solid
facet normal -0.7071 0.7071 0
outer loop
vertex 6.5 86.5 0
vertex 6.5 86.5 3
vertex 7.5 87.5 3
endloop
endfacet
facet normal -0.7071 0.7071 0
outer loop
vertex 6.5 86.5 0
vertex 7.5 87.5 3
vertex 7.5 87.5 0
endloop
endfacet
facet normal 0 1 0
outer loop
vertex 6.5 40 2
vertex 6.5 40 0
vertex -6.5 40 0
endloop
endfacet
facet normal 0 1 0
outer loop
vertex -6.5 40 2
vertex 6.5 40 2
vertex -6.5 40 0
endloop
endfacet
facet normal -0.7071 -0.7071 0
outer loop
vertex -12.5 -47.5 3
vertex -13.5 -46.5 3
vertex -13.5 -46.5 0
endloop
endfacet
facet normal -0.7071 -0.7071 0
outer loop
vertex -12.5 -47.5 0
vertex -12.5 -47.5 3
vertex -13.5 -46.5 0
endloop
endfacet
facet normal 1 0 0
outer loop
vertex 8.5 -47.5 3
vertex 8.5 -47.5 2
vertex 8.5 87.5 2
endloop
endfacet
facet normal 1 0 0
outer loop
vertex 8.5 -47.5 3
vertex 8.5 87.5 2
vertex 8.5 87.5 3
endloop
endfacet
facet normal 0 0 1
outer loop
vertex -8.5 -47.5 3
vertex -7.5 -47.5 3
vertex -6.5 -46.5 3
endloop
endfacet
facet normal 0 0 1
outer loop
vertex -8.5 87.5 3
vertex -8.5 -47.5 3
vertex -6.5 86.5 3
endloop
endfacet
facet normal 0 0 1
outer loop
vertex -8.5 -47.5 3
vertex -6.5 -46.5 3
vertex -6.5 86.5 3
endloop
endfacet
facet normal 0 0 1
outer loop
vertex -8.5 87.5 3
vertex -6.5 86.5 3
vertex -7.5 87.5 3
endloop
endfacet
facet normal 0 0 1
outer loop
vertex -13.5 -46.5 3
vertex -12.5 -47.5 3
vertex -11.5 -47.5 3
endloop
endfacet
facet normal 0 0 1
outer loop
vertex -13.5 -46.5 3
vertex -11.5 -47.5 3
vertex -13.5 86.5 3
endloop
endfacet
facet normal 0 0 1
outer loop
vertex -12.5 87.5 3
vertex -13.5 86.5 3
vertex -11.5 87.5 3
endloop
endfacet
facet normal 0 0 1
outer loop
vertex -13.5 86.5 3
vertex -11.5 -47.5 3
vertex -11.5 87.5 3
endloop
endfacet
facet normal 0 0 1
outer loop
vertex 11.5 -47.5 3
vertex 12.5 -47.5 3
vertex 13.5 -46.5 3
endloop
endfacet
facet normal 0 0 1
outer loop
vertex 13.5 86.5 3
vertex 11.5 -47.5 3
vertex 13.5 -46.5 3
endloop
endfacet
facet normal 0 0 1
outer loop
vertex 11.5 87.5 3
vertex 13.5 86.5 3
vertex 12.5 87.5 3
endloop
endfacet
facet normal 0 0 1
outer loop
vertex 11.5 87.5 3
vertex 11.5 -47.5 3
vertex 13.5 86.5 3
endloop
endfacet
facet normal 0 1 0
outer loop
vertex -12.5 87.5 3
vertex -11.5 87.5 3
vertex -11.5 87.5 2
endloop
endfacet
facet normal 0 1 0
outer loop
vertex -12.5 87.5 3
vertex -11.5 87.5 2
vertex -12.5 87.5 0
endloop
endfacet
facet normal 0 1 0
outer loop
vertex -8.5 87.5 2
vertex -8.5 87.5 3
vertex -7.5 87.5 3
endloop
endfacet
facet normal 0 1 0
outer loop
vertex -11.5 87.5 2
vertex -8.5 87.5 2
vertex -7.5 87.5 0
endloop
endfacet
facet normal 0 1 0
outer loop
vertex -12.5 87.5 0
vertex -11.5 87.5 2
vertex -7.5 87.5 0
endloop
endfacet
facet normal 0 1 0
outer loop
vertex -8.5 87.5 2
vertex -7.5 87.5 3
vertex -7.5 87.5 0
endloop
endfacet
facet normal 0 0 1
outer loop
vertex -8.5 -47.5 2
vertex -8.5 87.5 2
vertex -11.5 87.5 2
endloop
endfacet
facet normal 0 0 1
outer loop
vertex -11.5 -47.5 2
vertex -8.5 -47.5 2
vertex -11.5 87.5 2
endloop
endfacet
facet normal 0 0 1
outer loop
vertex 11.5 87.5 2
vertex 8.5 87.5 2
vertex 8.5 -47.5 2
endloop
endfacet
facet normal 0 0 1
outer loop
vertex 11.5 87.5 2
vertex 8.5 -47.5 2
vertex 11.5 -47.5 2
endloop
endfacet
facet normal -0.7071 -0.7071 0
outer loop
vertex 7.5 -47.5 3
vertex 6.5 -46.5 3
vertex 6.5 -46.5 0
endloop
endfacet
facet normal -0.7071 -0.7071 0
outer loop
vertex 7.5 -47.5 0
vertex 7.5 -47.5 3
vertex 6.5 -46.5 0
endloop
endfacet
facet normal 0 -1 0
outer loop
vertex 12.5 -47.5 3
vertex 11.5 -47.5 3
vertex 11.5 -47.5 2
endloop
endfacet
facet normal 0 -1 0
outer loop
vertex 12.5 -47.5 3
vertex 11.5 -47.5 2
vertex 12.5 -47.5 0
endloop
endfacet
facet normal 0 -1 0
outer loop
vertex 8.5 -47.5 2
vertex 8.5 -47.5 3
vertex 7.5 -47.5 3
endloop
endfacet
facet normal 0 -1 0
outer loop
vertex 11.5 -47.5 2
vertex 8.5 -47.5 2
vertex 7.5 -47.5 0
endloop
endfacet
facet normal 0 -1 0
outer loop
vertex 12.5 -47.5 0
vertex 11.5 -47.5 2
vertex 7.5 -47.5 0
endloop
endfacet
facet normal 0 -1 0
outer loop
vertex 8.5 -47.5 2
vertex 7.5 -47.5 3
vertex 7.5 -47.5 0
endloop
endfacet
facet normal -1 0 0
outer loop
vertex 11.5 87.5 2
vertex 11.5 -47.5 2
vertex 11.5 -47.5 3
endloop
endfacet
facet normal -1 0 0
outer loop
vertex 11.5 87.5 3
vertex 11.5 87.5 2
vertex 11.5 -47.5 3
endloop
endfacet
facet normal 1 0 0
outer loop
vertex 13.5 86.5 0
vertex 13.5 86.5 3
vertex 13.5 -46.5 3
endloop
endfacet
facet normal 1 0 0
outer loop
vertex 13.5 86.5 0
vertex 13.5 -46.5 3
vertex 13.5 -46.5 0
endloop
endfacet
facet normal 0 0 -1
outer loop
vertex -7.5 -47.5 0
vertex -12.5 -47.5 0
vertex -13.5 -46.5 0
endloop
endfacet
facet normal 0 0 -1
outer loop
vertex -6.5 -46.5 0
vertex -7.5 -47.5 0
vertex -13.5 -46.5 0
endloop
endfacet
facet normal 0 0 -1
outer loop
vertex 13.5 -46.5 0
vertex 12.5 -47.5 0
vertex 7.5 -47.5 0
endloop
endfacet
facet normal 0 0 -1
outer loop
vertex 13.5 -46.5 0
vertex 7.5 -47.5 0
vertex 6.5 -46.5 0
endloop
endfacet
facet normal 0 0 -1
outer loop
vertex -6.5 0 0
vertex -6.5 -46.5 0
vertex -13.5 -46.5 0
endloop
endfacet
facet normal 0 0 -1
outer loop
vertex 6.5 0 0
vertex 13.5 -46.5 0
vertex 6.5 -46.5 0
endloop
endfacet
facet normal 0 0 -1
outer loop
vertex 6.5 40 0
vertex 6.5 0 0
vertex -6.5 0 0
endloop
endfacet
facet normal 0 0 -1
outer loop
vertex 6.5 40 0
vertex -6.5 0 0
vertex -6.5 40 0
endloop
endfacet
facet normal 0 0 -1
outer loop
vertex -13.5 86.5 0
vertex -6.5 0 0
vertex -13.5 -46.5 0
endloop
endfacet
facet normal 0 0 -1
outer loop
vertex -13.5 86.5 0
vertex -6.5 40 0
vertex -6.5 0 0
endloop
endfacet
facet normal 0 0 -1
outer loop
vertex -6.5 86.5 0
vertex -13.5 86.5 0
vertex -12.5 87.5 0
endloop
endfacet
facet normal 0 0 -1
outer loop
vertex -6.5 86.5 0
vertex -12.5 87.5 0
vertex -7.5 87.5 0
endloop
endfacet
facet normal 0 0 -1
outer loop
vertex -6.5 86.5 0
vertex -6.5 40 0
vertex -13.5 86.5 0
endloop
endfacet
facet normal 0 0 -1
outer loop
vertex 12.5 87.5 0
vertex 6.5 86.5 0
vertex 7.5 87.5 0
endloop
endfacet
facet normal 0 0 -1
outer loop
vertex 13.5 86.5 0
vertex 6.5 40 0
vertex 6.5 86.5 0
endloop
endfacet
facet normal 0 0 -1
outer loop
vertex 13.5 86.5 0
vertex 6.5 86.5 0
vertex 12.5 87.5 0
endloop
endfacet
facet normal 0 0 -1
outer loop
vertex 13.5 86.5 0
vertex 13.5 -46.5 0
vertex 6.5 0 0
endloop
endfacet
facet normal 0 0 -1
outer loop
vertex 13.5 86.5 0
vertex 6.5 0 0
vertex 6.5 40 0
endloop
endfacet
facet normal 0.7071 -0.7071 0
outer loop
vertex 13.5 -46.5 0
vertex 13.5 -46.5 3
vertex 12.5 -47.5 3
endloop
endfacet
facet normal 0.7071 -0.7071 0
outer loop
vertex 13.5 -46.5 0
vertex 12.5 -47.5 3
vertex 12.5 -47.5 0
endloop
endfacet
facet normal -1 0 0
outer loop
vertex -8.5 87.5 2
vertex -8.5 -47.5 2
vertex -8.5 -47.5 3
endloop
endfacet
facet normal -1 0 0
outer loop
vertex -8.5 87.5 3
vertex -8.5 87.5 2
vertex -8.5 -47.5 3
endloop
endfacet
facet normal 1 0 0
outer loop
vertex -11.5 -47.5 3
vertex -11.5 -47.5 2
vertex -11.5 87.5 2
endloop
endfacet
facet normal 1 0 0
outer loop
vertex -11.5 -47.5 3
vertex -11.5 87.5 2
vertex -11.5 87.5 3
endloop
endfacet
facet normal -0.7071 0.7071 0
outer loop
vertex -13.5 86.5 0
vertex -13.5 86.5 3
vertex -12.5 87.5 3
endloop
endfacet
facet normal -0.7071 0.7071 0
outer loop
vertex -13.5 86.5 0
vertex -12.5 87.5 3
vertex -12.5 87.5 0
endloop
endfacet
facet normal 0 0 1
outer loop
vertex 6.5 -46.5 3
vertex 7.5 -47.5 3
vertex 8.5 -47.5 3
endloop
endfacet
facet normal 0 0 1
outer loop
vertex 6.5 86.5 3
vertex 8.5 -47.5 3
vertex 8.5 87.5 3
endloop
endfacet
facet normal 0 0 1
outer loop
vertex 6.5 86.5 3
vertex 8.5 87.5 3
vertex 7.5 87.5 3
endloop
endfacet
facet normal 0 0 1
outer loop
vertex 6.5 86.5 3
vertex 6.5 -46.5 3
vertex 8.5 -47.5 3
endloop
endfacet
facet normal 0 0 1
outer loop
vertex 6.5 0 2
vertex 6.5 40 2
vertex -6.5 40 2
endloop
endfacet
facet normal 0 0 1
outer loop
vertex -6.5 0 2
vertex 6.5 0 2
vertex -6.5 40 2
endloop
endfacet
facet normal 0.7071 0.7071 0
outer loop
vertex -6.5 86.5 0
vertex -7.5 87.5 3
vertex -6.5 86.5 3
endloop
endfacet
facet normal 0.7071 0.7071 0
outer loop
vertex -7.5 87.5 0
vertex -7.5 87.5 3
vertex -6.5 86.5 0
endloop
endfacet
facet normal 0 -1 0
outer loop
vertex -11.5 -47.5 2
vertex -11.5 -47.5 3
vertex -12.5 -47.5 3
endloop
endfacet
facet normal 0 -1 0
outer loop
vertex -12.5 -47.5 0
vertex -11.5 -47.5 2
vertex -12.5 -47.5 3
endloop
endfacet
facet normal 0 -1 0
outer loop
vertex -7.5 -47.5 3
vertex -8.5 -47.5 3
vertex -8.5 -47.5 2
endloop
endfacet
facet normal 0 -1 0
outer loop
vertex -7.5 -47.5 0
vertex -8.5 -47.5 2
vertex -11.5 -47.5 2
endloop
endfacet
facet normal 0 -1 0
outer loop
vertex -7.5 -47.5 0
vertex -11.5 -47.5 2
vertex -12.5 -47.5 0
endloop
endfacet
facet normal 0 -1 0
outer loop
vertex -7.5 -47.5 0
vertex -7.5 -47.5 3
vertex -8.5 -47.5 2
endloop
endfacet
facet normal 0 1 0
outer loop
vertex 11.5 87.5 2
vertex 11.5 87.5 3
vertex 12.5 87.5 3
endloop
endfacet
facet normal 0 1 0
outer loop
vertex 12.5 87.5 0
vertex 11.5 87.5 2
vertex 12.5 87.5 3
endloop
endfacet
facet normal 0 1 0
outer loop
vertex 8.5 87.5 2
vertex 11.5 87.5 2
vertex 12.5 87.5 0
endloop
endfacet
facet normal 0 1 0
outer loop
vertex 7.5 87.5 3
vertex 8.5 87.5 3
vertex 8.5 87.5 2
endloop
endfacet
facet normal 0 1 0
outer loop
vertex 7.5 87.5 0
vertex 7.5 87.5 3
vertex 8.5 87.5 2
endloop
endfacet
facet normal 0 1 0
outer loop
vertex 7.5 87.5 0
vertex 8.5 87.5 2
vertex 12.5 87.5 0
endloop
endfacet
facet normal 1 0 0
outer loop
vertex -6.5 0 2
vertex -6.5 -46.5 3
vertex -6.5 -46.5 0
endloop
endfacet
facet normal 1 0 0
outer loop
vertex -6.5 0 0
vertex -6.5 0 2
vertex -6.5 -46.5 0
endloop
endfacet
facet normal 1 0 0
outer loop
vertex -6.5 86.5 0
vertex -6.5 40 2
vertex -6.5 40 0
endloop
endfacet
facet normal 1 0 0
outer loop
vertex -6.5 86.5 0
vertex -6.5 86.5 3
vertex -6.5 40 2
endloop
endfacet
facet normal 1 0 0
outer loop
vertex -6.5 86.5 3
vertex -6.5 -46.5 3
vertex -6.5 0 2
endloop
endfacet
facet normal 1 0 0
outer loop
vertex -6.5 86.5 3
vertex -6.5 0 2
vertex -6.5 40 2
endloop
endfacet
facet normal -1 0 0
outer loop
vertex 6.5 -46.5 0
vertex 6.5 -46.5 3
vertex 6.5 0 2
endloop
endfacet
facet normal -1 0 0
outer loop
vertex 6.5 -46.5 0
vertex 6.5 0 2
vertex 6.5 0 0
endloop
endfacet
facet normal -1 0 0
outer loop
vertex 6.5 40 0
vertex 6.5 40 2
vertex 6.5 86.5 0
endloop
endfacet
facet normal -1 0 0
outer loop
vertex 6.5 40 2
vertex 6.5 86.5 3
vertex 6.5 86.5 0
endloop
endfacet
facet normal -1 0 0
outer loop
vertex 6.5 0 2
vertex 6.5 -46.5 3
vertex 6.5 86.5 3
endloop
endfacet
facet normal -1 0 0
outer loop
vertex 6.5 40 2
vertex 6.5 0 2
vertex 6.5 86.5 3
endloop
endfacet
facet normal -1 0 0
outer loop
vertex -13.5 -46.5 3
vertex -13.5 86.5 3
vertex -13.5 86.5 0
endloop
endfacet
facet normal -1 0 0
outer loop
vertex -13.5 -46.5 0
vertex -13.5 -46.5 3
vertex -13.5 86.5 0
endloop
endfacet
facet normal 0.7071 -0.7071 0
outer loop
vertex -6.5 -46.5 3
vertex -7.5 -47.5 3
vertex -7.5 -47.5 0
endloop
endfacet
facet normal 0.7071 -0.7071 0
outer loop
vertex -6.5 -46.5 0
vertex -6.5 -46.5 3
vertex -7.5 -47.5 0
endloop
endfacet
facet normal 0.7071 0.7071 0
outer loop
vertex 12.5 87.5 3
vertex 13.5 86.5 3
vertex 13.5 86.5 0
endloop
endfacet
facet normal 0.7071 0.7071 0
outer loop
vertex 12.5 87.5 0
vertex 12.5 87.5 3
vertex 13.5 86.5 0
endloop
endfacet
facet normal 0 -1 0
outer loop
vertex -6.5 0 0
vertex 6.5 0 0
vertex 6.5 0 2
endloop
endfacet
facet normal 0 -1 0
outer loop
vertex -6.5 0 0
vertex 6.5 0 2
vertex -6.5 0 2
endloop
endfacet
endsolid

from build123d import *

# Parameters (mm, degrees)
SCHIZZO1_W                   = 6.5
SCHIZZO1_H                   = 40
ESTRUSIONE_ESTRUSIONE1_DEPTH = 2
SCHIZZO2_W                   = 3
SCHIZZO2_H                   = 135
ESTRUSIONE_ESTRUSIONE2_DEPTH = 7
SMUSSO1_SIZE                 = 1
SCHIZZO4_W                   = 3
SCHIZZO4_H                   = 1
TAGLIO_ESTRUSIONE1_DEPTH     = 136.706484738
SMUSSO1_OF_SPECCHIA9_SIZE    = 1


with BuildPart() as part:
    # Schizzo1 → Estrusione-Estrusione1 (new body)
    with BuildSketch(Plane.XY):
        with Locations((3.25, 20)):
            Rectangle(SCHIZZO1_W, SCHIZZO1_H)
    estrusione_estrusione1 = extrude(amount=ESTRUSIONE_ESTRUSIONE1_DEPTH)

    # Schizzo2 → Estrusione-Estrusione2 (add)
    with BuildSketch(Plane(origin=(6.5, 0, 0), x_dir=(0, 0, -1), z_dir=(1, 0, 0))):
        with Locations((-1.5, 20)):
            Rectangle(SCHIZZO2_W, SCHIZZO2_H)
    estrusione_estrusione2 = extrude(amount=ESTRUSIONE_ESTRUSIONE2_DEPTH)

    # Smusso1
    smusso1_edges = [part.edges().sort_by_distance(p)[0] for p in [
        (6.5, 87.5, 1.5),
        (6.5, -47.5, 1.5),
        (13.5, 87.5, 1.5),
        (13.5, -47.5, 1.5),
    ]]
    chamfer(smusso1_edges, length=SMUSSO1_SIZE)

    # Schizzo4 → Taglio-Estrusione1 (cut, through all)
    with BuildSketch(Plane.XZ.offset(47.5)):
        with Locations((10, 2.5)):
            Rectangle(SCHIZZO4_W, SCHIZZO4_H)
    taglio_estrusione1 = extrude(amount=-TAGLIO_ESTRUSIONE1_DEPTH, mode=Mode.SUBTRACT)

    # Specchia9: Estrusione-Estrusione1, Estrusione-Estrusione2, Taglio-Estrusione1 across plane
    add(estrusione_estrusione1.mirror(Plane.ZY))
    add(estrusione_estrusione2.mirror(Plane.ZY))
    add(taglio_estrusione1.mirror(Plane.ZY), mode=Mode.SUBTRACT)

    # Smusso1 of Specchia9
    smusso1_of_specchia9_edges = [part.edges().sort_by_distance(p)[0] for p in [
        (-6.5, 87.5, 1.5),
        (-6.5, -47.5, 1.5),
        (-13.5, 87.5, 1.5),
        (-13.5, -47.5, 1.5),
    ]]
    chamfer(smusso1_of_specchia9_edges, length=SMUSSO1_OF_SPECCHIA9_SIZE)


solid = part.part
